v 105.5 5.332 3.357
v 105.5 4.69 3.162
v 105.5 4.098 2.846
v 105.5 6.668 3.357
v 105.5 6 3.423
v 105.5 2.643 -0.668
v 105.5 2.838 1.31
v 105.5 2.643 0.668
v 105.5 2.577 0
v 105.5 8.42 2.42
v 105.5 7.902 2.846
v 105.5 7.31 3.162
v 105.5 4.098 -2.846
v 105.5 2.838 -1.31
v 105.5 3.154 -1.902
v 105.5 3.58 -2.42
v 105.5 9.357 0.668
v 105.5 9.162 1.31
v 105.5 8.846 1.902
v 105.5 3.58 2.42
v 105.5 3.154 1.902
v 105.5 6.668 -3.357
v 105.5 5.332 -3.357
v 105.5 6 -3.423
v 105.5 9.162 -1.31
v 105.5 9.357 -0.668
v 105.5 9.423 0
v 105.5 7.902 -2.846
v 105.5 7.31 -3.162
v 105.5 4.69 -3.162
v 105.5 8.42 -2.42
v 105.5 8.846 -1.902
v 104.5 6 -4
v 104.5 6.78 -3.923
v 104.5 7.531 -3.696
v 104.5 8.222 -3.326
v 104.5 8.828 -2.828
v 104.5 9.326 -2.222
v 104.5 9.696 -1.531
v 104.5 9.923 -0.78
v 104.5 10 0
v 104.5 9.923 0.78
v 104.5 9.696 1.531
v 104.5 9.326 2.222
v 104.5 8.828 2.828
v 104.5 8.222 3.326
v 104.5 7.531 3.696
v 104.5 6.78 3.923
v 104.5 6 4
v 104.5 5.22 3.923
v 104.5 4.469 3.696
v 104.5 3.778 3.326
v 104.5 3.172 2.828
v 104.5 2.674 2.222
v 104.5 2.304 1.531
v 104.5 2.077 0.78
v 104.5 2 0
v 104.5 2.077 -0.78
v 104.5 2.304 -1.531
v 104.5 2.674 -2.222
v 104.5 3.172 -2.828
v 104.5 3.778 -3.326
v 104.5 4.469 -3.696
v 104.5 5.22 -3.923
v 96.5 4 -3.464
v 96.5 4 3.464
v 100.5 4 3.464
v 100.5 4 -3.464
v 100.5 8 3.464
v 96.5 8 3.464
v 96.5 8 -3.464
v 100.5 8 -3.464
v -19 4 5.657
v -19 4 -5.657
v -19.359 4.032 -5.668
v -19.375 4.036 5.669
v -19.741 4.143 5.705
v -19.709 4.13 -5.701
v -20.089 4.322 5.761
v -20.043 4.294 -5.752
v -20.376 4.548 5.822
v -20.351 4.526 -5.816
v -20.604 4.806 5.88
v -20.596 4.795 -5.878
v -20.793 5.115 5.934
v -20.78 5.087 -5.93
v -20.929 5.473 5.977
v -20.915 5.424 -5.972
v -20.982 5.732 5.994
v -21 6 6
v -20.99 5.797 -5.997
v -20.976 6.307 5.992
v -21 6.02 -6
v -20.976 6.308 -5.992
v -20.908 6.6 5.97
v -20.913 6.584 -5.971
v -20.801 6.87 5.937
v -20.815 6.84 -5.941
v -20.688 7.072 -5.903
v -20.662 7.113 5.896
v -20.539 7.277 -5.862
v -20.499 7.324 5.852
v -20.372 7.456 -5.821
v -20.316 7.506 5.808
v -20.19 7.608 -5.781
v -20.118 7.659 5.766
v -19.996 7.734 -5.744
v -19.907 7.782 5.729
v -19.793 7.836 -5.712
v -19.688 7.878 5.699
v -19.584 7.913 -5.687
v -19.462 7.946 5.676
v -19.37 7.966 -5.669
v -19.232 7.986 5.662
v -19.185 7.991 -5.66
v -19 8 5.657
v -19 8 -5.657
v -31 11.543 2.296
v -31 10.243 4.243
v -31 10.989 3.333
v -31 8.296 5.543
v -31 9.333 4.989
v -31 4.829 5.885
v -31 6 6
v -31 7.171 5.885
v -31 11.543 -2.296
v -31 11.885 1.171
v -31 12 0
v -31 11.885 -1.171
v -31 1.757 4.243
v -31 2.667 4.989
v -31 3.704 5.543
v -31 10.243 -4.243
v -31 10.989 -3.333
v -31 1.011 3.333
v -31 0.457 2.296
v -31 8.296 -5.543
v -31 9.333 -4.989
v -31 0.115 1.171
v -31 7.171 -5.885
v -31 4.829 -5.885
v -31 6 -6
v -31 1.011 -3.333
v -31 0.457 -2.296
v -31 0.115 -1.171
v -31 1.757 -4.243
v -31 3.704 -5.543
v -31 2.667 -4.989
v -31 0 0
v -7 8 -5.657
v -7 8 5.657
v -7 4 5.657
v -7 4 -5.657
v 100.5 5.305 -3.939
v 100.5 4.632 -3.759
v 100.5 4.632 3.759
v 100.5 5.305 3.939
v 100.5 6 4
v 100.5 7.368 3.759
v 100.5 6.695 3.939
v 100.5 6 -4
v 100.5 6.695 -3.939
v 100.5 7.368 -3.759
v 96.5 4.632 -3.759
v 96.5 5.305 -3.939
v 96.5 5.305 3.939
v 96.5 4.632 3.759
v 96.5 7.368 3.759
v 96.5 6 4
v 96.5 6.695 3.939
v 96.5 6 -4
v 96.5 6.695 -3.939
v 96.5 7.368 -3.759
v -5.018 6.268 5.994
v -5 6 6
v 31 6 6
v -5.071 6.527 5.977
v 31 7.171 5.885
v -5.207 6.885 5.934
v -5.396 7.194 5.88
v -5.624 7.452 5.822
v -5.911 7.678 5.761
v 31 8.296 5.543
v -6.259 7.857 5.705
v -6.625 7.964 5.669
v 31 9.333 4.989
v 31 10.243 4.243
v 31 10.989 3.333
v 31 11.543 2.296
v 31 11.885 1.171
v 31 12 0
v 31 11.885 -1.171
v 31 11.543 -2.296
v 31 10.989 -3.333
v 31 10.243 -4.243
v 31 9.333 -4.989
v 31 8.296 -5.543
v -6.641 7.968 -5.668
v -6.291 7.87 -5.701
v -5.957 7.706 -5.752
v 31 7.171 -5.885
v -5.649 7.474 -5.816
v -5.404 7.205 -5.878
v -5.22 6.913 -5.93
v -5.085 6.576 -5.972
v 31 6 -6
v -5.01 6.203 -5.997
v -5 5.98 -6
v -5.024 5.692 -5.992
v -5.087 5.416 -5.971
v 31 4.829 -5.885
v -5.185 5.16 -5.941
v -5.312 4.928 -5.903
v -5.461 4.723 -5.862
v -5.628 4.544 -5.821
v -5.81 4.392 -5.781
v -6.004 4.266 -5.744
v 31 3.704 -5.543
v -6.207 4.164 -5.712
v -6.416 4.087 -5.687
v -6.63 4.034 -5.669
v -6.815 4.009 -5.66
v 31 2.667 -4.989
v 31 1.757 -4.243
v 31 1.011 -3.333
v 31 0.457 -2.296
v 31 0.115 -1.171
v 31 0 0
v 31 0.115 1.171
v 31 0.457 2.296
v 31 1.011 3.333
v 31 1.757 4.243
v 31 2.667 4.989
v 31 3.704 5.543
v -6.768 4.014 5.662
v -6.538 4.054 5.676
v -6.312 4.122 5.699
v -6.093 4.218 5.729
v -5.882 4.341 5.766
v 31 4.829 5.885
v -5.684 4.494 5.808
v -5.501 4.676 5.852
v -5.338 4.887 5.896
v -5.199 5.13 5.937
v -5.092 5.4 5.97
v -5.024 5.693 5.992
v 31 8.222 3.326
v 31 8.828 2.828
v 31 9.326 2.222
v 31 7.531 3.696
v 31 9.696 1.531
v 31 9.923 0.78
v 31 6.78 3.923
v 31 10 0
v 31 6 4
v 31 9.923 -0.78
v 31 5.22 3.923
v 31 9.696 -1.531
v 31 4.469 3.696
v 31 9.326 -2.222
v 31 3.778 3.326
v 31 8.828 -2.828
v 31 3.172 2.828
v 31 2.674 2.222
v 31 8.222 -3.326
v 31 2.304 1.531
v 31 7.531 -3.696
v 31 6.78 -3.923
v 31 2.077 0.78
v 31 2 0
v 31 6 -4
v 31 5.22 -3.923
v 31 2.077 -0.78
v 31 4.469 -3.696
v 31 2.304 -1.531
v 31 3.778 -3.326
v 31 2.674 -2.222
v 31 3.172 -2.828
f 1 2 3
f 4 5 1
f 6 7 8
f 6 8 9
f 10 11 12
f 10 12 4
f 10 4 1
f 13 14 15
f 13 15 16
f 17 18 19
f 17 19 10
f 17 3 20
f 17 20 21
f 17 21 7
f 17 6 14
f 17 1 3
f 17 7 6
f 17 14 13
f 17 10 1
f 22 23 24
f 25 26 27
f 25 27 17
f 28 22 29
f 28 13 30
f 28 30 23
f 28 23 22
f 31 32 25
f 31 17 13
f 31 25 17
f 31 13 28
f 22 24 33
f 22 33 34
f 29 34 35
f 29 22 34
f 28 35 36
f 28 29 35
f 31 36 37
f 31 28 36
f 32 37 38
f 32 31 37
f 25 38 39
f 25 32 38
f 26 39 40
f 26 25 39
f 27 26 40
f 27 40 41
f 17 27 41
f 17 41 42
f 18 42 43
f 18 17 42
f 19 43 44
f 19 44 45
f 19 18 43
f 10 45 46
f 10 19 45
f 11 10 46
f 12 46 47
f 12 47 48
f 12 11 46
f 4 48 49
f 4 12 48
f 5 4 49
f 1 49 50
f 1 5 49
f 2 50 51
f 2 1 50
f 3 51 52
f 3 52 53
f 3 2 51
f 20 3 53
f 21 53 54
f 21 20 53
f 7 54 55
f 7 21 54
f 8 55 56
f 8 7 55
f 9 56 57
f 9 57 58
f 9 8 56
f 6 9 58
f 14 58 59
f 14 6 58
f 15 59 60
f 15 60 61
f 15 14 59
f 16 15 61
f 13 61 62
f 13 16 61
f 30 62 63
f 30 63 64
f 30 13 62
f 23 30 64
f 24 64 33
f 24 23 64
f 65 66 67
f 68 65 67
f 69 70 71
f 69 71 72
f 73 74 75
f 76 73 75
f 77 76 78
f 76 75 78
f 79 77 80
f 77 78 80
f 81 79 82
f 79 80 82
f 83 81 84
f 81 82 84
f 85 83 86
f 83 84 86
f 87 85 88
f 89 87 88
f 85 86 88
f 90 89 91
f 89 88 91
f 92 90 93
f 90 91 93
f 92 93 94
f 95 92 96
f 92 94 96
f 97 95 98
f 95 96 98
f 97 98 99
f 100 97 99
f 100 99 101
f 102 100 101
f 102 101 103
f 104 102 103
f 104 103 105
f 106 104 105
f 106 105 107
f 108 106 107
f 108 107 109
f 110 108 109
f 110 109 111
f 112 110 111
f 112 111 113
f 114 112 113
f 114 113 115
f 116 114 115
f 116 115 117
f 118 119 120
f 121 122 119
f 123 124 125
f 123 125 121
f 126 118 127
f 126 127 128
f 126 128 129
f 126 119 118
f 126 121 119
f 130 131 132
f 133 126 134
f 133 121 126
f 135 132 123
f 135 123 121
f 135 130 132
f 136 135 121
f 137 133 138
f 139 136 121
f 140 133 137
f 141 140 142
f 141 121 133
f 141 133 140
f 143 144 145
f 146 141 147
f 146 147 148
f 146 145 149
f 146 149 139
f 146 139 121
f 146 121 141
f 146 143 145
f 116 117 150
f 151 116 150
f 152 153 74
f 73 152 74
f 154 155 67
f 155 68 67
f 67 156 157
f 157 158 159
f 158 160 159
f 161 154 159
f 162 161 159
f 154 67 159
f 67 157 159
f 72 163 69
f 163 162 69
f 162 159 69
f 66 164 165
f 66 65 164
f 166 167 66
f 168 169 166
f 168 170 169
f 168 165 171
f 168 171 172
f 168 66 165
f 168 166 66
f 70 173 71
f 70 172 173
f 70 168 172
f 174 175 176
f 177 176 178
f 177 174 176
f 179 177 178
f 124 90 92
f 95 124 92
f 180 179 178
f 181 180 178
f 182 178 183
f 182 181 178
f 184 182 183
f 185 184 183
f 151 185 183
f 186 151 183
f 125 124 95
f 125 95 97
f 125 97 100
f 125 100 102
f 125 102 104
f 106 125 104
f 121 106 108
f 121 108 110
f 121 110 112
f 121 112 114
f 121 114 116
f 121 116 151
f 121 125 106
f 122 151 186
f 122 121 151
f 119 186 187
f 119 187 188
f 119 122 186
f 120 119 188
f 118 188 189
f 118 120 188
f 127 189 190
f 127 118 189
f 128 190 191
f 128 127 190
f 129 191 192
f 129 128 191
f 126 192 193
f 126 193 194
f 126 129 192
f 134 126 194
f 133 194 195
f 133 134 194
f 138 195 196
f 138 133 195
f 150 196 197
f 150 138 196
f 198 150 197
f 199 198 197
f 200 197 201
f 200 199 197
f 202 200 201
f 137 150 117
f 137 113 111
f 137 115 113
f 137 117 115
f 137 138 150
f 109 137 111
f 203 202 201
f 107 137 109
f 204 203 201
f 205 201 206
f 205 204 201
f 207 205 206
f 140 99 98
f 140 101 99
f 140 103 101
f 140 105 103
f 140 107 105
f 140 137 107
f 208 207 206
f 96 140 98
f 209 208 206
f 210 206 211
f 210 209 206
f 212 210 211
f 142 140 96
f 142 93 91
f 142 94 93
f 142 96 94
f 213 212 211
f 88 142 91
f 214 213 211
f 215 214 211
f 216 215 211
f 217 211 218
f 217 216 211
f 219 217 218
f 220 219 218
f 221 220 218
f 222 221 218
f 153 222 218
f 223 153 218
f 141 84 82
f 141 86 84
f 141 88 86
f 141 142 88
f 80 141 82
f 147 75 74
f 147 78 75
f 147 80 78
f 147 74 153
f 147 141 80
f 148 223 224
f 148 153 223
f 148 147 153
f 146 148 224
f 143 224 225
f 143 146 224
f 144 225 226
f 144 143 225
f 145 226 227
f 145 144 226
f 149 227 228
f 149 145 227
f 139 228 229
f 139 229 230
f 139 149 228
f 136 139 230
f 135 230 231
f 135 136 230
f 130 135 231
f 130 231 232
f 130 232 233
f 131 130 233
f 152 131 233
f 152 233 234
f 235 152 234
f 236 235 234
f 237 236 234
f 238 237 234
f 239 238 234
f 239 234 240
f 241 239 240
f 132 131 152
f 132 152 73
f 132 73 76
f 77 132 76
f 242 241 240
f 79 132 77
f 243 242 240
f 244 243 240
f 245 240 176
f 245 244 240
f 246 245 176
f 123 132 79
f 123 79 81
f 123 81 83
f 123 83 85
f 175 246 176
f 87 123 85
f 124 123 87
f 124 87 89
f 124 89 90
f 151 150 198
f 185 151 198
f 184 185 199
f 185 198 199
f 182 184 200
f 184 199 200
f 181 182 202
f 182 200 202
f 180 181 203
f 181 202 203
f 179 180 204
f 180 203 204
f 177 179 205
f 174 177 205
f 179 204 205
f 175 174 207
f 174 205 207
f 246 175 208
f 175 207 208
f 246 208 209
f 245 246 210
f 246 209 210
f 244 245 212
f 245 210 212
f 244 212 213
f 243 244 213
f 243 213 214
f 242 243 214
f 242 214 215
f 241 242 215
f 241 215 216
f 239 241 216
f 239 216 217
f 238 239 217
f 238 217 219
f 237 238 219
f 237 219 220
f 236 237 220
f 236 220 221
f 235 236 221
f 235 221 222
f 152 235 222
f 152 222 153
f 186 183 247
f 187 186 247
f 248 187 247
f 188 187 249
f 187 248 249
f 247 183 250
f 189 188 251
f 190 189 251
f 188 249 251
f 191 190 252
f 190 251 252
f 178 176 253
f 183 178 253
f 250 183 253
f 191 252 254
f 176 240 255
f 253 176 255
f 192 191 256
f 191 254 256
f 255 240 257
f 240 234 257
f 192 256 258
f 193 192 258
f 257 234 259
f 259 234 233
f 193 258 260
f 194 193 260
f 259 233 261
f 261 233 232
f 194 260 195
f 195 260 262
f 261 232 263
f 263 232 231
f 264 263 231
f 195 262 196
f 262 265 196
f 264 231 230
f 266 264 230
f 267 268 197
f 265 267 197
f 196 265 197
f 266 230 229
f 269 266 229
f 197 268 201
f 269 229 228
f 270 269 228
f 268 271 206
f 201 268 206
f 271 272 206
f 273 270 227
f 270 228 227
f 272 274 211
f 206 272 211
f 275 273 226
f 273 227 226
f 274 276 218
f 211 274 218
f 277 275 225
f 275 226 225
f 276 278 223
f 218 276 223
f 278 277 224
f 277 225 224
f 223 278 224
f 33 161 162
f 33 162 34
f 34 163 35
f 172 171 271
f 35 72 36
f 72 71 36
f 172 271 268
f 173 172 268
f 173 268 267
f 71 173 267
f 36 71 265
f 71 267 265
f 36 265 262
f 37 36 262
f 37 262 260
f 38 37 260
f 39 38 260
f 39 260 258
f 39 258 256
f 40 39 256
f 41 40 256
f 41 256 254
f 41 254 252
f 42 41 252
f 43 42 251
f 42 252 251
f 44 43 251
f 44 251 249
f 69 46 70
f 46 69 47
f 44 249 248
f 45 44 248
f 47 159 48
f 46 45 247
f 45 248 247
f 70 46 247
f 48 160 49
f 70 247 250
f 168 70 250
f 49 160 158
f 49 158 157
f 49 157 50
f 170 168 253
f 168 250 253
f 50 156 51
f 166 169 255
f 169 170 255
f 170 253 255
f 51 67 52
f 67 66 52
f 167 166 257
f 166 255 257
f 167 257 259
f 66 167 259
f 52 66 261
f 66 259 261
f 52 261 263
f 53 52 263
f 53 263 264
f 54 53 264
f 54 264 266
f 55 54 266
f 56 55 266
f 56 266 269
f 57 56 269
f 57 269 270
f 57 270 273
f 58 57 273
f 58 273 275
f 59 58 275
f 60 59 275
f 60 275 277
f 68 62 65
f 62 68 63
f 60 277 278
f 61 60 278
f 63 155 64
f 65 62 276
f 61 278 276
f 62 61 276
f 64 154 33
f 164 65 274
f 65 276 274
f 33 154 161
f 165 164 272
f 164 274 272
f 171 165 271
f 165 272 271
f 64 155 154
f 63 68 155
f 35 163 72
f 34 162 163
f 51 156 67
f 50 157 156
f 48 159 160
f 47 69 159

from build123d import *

# Parameters (mm, degrees)
SKETCH1_W               = 62
SKETCH1_H               = 21.285714286
BOSS_EXTRUDE1_DEPTH     = 12
SKETCH3_R               = 4
BOSS_EXTRUDE2_DEPTH     = 74.5
SKETCH4_OUTSIDE_W       = 51.02
SKETCH4_OUTSIDE_H       = 41.734
SKETCH4_OUTSIDE_R       = 6
CUT_EXTRUDE2_DEPTH      = 137.5
SKETCH5_W               = 4
SKETCH5_H               = 4
CUT_EXTRUDE3_DEPTH      = 7
CUT_EXTRUDE3_DEPTH_BACK = 7
CHAMFER1_SIZE           = 1
CHAMFER1_SIZE2          = 0.577350269


with BuildPart() as part:
    # Sketch1 → Boss-Extrude1 (new body)
    with BuildSketch(Plane(origin=(0, 0, 0), x_dir=(1, 0, 0), z_dir=(0, 1, 0))):
        Rectangle(SKETCH1_W, SKETCH1_H)
    extrude(amount=BOSS_EXTRUDE1_DEPTH)

    # Sketch3 → Boss-Extrude2 (add)
    with BuildSketch(Plane(origin=(31, 0, 0), x_dir=(0, 0, -1), z_dir=(1, 0, 0))):
        with Locations((0, 6)):
            Circle(SKETCH3_R)
    extrude(amount=BOSS_EXTRUDE2_DEPTH)

    # Sketch4 outside → Cut-Extrude2 (cut, through all)
    with BuildSketch(Plane.ZY.offset(31)):
        with Locations((0, 6)):
            Rectangle(SKETCH4_OUTSIDE_W, SKETCH4_OUTSIDE_H)
        with Locations((0, 6)):
            Circle(SKETCH4_OUTSIDE_R, mode=Mode.SUBTRACT)
    extrude(amount=-CUT_EXTRUDE2_DEPTH, mode=Mode.SUBTRACT)

    # Sketch5 → Cut-Extrude3 (cut, two sides)
    with BuildSketch(Plane.XY) as cut_extrude3_sk:
        with BuildLine():
            Line((-19, 8), (-7, 8))
            ThreePointArc((-7, 8), (-5, 6), (-7, 4))
            Line((-7, 4), (-19, 4))
            ThreePointArc((-19, 4), (-21, 6), (-19, 8))
        make_face()
        with Locations((98.5, 6)):
            Rectangle(SKETCH5_W, SKETCH5_H)
    extrude(amount=CUT_EXTRUDE3_DEPTH, mode=Mode.SUBTRACT)
    extrude(cut_extrude3_sk.sketch, amount=-CUT_EXTRUDE3_DEPTH_BACK, mode=Mode.SUBTRACT)

    # Chamfer1
    chamfer1_edges = [part.edges().sort_by_distance(p)[0] for p in [
        (105.5, 6, 4),
    ]]
    chamfer1_side = [part.faces().sort_by_distance(p)[0] for p in [
        (68.25, 6, 4),
    ]]
    chamfer(chamfer1_edges, length=CHAMFER1_SIZE, length2=CHAMFER1_SIZE2, reference=chamfer1_side[0])


solid = part.part
